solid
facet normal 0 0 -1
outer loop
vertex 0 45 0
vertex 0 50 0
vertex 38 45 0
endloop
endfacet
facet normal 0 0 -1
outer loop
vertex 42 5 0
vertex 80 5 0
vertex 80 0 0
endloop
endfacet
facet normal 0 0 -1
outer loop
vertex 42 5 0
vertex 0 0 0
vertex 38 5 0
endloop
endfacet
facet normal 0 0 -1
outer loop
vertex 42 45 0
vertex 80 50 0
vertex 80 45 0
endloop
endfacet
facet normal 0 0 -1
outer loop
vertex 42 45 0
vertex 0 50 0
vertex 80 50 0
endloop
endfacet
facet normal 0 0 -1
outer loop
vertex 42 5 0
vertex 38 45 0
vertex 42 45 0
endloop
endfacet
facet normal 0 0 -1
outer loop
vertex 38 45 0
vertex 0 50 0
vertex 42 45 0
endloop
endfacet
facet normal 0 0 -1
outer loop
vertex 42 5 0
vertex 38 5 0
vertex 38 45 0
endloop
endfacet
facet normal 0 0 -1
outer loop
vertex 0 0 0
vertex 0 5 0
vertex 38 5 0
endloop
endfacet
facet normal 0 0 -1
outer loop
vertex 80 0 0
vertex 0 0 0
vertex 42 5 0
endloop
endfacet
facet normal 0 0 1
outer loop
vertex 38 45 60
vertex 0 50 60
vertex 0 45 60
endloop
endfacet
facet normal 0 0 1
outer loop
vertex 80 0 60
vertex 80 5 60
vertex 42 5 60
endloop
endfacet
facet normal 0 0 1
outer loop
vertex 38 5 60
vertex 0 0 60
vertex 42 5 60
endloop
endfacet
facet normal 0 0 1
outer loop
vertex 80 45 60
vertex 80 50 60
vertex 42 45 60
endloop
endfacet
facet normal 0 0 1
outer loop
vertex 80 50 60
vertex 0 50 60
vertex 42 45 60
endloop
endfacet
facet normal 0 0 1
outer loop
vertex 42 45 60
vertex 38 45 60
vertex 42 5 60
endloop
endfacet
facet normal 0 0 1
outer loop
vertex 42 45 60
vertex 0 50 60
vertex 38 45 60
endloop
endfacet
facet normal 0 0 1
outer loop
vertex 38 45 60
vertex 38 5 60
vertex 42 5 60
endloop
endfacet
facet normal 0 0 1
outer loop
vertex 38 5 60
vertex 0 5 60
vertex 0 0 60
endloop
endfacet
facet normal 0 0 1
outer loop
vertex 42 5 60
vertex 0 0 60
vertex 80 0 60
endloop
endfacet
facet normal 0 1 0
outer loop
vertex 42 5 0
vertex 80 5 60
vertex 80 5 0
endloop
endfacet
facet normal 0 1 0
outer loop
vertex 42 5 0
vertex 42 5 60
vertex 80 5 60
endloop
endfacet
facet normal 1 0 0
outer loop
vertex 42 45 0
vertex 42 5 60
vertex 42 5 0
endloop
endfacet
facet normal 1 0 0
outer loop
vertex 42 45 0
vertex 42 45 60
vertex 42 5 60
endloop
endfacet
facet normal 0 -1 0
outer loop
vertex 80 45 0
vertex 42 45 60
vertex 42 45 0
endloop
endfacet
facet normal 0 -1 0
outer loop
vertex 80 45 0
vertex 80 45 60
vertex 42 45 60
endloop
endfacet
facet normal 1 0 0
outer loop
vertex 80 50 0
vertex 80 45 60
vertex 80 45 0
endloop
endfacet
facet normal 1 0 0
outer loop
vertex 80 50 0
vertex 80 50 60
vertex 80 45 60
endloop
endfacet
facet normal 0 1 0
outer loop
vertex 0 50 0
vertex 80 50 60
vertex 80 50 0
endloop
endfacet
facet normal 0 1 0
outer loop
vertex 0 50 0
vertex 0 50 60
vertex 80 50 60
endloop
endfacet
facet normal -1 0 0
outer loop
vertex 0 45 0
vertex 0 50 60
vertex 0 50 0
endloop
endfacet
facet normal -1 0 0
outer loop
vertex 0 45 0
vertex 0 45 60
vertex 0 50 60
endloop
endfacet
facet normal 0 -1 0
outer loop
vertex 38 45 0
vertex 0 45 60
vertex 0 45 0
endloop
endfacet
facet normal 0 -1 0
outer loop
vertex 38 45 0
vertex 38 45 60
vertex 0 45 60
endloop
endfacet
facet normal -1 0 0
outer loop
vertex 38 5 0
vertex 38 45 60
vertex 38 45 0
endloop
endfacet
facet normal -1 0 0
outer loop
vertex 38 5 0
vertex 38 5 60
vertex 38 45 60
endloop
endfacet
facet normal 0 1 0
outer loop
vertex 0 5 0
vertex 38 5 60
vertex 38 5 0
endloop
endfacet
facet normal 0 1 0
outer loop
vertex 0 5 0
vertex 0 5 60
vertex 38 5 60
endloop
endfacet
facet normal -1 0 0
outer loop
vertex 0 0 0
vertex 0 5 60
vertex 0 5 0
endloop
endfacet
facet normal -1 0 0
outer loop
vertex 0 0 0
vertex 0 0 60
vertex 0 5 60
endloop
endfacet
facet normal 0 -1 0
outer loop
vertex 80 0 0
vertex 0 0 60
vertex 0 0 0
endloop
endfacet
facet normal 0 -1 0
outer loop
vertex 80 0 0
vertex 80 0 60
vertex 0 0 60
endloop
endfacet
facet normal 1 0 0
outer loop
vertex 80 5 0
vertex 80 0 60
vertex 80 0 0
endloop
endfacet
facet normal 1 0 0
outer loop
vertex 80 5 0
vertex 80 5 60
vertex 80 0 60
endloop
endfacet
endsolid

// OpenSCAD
$fn = 32;

// ----------------------------------------------------------------------
// Structural section: ibeam 80 x 50 mm
// ----------------------------------------------------------------------

// --- parameters (mm) ---
sec_w = 80;               // section width, X
sec_h = 50;               // section height, Y
flange_t = 5;             // flange thickness
web_t = 4;                // web thickness
plate_t = 60;             // cut length, Z (extrusion height)

profile = [[0, 0], [80, 0], [80, 5], [42, 5], [42, 45], [80, 45], [80, 50], [0, 50], [0, 45], [38, 45], [38, 5], [0, 5]];  // primary outline, 12 points, counter clockwise

// --- the one profile operation ---
linear_extrude(height = plate_t) polygon(points = profile);
